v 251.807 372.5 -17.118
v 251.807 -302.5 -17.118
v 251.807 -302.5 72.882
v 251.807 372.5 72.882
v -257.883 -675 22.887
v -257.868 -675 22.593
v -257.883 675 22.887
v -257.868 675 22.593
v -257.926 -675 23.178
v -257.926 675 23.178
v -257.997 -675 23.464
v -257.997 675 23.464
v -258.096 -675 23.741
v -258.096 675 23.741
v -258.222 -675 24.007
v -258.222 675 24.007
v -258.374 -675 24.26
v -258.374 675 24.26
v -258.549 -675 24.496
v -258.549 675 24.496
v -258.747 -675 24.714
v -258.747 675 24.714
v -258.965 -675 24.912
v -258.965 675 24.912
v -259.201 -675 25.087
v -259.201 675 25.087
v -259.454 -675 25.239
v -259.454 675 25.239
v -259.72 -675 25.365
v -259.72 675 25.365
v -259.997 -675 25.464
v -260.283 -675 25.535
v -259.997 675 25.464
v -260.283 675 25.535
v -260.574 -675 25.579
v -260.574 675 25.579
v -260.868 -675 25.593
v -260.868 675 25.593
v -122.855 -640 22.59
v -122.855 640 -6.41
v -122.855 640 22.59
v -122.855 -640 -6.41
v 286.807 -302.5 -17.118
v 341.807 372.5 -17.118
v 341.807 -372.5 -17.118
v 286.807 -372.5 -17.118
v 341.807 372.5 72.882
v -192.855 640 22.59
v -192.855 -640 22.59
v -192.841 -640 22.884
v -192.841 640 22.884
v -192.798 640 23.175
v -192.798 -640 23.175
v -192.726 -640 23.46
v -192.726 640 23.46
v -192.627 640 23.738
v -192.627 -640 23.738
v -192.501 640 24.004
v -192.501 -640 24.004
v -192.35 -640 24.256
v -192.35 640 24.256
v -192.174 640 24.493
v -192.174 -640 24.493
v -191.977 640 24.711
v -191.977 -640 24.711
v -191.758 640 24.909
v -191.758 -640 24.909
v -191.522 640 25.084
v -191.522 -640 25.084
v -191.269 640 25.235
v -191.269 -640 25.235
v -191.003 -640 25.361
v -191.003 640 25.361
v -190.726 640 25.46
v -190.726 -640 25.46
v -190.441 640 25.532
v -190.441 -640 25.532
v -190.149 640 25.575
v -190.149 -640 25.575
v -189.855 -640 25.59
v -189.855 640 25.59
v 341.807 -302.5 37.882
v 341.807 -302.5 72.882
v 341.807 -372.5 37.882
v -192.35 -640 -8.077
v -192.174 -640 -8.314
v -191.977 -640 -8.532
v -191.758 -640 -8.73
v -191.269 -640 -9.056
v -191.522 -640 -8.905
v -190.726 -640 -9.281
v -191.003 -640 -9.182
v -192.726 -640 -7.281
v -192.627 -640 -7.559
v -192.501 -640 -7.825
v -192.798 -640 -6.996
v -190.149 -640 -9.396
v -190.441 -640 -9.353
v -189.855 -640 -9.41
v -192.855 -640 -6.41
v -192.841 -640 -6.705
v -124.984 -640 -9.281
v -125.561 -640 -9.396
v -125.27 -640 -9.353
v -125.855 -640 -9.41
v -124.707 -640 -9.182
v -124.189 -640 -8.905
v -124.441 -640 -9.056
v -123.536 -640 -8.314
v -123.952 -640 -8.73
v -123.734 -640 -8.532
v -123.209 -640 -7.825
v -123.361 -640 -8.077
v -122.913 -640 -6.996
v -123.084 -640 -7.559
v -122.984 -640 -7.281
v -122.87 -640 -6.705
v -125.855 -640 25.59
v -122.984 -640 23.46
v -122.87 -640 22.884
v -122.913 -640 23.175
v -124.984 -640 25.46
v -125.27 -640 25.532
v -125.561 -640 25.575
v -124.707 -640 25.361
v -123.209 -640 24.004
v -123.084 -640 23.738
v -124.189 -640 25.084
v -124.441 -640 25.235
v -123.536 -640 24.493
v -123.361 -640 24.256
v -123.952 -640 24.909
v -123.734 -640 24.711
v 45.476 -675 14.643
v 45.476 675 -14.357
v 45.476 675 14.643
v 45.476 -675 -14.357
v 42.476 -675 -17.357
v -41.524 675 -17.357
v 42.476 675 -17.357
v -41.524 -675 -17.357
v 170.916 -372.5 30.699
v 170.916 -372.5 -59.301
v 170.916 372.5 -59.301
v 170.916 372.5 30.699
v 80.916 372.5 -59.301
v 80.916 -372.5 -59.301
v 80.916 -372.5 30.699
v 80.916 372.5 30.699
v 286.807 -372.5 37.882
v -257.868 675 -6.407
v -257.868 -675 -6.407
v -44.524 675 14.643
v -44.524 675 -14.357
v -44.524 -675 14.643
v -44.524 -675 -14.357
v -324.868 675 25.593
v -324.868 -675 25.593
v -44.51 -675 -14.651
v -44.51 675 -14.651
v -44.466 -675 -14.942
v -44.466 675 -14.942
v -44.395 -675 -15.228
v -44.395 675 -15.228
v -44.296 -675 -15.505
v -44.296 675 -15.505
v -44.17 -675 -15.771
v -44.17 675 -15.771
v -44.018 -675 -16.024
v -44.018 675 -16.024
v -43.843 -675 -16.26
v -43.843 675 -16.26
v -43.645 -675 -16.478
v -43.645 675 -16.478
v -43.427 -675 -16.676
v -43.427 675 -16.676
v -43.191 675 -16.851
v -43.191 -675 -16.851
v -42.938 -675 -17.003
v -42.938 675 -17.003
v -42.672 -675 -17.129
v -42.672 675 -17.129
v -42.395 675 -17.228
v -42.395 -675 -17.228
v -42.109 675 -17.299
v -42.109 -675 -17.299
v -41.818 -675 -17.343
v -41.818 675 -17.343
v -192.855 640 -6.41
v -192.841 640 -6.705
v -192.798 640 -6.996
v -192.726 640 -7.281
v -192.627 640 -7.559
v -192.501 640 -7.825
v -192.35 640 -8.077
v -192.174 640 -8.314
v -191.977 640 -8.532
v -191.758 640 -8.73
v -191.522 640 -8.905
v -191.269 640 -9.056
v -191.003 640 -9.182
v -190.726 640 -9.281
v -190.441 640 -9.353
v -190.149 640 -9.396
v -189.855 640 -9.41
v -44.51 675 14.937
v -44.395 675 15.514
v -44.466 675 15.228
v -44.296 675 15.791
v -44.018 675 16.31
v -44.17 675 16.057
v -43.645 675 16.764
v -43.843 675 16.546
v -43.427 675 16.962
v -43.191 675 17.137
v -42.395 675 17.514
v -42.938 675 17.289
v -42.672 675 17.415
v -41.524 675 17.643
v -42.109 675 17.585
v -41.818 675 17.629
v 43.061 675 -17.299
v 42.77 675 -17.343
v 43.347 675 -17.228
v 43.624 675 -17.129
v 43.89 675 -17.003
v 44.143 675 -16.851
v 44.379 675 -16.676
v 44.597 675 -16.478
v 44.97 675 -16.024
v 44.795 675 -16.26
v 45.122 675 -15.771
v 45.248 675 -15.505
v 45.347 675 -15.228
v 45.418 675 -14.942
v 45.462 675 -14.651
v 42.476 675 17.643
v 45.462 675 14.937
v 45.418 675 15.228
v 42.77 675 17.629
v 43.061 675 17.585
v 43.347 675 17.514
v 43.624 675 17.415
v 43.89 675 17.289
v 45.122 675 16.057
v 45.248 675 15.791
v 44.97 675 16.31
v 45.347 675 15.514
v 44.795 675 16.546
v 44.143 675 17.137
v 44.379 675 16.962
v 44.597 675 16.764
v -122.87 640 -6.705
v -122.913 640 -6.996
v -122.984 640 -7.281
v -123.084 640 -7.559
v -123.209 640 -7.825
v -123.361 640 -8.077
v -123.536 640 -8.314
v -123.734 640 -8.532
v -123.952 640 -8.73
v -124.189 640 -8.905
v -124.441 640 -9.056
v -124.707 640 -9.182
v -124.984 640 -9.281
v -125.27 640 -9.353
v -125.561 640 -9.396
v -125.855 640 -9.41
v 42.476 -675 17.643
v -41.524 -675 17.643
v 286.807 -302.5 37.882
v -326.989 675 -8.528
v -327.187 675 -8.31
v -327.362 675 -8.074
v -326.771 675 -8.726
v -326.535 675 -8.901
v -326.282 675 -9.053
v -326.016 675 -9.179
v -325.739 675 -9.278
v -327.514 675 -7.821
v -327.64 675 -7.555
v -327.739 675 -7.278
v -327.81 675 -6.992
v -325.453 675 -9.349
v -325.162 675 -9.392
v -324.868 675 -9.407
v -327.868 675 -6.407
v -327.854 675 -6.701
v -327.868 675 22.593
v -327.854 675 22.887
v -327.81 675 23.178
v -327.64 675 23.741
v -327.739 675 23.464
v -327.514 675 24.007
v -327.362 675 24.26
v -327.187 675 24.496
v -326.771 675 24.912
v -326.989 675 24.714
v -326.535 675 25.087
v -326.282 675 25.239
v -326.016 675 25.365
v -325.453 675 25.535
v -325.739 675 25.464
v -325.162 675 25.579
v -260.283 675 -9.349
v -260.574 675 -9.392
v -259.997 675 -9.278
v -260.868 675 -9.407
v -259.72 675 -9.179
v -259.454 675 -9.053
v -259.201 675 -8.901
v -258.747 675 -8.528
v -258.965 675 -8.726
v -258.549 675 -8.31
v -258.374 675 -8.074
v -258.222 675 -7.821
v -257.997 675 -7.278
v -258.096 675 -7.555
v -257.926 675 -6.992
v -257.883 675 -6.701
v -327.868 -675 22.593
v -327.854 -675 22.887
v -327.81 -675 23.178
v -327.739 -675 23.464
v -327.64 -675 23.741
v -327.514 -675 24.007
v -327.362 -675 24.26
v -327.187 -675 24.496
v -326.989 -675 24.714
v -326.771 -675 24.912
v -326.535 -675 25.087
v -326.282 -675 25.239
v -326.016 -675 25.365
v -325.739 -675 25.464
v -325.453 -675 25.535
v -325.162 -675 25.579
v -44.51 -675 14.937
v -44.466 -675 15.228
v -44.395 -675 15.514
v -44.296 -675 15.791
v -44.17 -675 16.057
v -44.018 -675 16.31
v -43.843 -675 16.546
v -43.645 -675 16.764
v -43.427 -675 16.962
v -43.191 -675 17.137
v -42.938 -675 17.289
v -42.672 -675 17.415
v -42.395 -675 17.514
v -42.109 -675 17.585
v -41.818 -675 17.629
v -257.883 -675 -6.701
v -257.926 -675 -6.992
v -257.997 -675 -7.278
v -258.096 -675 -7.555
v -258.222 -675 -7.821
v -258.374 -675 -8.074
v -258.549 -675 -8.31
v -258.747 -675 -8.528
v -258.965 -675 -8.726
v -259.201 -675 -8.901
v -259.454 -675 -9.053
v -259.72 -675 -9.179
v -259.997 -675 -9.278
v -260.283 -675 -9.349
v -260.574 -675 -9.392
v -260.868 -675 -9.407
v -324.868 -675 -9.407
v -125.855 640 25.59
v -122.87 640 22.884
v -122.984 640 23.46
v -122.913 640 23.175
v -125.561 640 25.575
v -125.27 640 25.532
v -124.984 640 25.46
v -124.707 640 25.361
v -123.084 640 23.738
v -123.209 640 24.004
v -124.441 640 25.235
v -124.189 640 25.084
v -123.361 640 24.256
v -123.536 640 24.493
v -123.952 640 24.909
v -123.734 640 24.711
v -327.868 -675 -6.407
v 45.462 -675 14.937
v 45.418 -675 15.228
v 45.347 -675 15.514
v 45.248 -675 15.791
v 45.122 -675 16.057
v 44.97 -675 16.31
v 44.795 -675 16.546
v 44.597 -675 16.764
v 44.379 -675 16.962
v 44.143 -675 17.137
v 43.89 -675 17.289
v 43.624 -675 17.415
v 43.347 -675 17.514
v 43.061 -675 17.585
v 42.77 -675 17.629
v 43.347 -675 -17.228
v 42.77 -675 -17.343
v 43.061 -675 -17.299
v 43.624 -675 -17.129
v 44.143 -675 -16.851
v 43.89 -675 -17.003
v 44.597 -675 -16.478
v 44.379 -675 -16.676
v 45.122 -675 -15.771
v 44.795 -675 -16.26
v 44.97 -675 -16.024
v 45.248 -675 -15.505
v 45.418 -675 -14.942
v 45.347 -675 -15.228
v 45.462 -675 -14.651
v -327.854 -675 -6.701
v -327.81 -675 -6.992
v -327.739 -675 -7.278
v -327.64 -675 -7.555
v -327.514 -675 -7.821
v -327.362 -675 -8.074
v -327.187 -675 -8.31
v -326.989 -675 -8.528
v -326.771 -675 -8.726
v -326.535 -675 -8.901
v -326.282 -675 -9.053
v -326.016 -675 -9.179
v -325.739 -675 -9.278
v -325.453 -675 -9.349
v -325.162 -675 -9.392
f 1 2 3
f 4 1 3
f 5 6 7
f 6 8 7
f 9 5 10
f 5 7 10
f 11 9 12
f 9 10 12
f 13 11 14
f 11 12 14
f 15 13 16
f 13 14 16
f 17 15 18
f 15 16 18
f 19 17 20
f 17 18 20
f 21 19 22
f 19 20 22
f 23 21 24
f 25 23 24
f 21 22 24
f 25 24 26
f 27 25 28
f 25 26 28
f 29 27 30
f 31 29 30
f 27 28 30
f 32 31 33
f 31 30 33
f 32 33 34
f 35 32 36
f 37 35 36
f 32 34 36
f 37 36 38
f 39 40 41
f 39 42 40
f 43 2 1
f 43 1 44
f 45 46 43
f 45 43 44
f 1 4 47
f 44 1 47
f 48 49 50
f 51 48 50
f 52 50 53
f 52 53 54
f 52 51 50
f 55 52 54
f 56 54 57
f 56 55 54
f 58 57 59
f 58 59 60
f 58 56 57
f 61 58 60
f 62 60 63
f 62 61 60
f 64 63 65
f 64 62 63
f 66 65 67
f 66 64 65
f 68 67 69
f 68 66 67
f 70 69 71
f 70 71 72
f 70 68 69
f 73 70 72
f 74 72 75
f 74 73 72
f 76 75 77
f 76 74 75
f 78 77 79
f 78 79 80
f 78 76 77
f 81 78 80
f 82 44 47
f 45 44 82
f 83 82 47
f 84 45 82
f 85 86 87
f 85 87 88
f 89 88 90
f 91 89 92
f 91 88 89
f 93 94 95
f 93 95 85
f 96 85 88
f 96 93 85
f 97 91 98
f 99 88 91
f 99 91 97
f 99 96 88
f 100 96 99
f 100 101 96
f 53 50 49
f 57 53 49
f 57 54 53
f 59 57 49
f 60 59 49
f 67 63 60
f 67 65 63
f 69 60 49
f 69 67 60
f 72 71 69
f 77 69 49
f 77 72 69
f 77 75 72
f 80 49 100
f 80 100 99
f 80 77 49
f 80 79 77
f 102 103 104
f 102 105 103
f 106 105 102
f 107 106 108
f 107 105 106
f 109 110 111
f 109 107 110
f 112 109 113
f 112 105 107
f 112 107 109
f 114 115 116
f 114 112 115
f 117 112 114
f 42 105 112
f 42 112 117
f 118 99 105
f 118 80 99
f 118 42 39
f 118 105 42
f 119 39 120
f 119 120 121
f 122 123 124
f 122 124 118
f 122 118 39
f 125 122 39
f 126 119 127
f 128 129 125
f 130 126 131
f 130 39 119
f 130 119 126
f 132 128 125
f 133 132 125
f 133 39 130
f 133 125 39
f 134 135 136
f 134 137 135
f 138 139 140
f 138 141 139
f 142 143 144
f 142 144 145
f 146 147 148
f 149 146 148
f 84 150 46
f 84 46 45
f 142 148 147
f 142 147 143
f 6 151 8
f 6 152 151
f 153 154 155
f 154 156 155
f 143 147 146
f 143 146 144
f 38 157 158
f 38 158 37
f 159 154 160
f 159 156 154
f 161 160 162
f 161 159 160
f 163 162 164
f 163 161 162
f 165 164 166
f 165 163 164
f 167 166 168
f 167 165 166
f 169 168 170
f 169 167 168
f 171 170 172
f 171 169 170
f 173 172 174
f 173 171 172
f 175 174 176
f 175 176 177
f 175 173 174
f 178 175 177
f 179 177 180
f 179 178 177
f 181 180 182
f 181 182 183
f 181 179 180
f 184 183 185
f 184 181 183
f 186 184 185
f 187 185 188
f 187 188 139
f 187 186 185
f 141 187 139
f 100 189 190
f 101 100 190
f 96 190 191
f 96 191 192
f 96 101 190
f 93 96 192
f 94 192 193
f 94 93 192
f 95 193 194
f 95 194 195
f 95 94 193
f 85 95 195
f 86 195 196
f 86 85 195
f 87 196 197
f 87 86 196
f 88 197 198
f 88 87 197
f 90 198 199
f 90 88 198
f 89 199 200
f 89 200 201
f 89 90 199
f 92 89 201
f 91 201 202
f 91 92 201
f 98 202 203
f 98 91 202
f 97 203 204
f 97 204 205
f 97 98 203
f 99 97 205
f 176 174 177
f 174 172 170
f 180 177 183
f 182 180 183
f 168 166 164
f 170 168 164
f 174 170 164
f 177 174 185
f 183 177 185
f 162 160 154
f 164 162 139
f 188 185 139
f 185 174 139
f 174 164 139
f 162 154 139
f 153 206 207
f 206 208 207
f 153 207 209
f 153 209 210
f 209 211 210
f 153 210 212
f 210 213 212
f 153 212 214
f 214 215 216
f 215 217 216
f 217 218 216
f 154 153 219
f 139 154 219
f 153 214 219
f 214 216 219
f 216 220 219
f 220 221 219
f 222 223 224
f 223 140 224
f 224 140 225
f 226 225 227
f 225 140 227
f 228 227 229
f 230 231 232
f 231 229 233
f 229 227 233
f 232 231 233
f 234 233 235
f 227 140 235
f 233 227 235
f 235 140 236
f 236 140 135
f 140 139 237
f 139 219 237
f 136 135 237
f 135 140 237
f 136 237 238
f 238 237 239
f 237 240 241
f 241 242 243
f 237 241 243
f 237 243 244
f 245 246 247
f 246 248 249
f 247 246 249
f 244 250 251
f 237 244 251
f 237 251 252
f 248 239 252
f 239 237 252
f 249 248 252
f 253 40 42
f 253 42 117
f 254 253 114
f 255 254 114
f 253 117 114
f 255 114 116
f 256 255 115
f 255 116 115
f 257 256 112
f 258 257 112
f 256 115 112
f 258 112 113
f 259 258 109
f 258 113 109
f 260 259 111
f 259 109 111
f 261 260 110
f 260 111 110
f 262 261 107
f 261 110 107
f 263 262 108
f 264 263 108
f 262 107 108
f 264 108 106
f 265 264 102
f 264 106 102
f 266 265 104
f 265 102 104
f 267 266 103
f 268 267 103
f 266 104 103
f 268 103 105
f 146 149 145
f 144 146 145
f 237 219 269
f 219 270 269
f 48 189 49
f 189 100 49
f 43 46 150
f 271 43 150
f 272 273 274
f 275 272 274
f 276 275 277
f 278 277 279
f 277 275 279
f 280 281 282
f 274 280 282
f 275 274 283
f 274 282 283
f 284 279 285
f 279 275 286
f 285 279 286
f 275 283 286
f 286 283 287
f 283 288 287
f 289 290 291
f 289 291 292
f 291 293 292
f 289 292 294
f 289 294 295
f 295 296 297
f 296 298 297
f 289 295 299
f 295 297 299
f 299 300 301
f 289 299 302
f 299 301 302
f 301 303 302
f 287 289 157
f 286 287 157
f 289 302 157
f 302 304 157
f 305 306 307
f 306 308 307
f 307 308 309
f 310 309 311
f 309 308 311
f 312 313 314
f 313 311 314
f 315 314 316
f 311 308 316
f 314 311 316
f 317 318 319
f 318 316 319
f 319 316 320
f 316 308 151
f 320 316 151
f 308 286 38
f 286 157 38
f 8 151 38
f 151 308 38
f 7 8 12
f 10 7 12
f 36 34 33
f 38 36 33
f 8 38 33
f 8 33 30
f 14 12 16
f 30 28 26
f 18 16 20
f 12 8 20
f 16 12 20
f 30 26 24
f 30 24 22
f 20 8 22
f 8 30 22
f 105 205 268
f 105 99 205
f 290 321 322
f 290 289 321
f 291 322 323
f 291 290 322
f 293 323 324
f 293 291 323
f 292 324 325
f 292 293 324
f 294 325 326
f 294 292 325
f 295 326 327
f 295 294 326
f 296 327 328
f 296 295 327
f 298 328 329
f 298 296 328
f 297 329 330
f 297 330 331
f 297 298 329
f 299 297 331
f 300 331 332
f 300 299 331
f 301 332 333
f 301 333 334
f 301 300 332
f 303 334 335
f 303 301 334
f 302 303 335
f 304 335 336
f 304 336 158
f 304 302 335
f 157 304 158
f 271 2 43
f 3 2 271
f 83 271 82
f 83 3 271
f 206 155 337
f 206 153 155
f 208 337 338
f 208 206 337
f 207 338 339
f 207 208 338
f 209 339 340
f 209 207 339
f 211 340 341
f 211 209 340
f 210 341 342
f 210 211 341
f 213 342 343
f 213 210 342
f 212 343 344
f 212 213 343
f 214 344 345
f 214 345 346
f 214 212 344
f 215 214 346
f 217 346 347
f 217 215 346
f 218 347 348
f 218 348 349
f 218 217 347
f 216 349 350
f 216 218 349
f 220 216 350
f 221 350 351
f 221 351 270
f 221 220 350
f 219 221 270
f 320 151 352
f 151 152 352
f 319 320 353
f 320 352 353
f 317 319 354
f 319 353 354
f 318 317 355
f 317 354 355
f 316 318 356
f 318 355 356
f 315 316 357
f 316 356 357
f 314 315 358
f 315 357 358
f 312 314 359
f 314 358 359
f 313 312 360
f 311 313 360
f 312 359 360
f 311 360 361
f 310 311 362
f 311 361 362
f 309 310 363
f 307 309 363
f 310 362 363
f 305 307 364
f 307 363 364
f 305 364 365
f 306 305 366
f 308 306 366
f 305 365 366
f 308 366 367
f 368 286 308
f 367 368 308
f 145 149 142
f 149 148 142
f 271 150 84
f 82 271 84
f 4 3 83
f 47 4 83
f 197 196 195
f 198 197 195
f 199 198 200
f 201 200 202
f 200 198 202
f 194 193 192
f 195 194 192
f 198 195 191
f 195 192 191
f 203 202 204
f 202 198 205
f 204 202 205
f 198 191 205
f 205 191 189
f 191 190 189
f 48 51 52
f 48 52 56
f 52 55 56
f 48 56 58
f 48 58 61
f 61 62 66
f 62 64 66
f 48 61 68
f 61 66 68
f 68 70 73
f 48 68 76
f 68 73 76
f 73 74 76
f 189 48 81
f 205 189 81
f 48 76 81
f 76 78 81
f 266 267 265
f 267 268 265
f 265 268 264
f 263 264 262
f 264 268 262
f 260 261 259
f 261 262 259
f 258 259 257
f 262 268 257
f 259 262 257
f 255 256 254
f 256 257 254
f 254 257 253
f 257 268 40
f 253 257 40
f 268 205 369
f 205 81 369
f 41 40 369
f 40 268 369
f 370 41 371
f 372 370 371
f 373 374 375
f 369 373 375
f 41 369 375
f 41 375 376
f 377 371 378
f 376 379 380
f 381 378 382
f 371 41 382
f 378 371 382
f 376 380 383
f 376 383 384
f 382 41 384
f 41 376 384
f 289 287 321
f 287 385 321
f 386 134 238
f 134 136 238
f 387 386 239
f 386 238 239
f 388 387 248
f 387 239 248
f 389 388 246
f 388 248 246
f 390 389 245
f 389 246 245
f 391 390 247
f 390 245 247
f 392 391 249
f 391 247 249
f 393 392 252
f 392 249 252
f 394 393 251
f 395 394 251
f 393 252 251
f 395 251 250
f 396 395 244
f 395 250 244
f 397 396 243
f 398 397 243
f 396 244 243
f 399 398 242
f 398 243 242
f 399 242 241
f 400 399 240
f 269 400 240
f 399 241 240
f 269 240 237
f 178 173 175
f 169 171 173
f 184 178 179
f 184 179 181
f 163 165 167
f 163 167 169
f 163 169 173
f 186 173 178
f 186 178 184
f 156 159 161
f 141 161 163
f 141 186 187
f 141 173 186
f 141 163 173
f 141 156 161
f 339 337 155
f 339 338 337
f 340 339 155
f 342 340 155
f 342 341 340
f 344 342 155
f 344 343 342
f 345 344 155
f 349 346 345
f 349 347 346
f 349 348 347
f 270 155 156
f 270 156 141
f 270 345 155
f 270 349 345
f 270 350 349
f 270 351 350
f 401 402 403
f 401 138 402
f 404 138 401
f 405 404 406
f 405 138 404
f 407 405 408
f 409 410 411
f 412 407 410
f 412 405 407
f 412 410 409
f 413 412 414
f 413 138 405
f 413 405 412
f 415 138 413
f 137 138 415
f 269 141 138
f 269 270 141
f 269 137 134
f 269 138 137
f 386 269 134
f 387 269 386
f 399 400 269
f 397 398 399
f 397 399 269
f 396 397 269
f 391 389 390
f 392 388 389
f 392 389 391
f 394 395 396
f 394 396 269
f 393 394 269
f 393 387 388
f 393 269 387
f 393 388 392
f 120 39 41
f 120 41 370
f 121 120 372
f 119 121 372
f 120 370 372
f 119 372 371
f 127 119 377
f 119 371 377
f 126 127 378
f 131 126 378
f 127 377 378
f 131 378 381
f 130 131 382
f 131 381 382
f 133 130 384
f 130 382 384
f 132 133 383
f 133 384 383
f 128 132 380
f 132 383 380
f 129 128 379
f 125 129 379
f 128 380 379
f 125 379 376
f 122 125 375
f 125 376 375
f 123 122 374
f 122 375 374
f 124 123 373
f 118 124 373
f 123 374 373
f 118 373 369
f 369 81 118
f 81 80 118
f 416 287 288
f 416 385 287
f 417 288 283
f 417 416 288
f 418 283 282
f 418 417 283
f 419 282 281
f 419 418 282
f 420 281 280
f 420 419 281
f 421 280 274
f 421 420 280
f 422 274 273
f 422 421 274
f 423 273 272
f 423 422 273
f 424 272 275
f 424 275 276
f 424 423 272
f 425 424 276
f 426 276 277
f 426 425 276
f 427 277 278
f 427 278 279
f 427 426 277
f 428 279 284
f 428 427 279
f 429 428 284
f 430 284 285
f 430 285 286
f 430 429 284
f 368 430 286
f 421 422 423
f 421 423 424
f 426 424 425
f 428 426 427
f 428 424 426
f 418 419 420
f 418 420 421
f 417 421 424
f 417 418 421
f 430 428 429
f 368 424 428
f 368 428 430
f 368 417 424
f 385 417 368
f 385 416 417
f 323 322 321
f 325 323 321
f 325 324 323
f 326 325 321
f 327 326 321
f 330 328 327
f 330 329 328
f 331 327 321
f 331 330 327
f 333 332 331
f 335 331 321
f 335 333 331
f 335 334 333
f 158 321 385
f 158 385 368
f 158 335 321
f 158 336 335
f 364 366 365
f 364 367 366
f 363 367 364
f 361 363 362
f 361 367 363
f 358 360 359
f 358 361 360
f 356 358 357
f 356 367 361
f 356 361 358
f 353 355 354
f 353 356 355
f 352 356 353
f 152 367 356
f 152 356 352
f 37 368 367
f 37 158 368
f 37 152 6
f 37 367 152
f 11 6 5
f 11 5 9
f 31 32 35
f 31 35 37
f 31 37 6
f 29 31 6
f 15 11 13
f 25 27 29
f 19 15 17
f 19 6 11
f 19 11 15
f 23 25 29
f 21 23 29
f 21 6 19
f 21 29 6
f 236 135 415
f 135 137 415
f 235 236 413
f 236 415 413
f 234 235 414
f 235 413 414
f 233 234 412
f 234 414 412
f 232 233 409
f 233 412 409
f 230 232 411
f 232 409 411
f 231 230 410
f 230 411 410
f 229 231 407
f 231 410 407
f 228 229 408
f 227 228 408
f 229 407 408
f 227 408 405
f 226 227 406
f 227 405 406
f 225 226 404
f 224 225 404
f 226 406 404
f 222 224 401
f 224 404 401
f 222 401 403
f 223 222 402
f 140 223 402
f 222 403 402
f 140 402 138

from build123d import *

# Parameters (mm, degrees)
F0_W      = 90
F0_H      = 35
F1_DEPTH  = 675
F2_R      = 3
F3_W      = 90
F3_H      = 90
F4_DEPTH  = 372.5
F5_W      = 70
F5_H      = 35
F6_DEPTH  = 640
F7_R      = 3
F8_W      = 70
F8_H      = 35
F9_DEPTH  = 675
F10_R     = 3
F11_W     = 90
F11_H     = 90
F12_DEPTH = 372.5
F13_W     = 35
F13_H     = 35
F13_W_2   = 55
F13_H_2   = 55
F14_DEPTH = 70


with BuildPart() as f1:
    # F0 (on Front) → F1 (new body, symmetric)
    with BuildSketch(Plane.XZ):
        with Locations((0.47596, 0.143029)):
            Rectangle(F0_W, F0_H)
    extrude(amount=F1_DEPTH, both=True)

    # F2
    f2_edges = [f1.edges().sort_by_distance(p)[0] for p in [
        (45.47596, 0, 17.643029),
        (45.47596, 0, -17.356971),
        (-44.52404, 0, 17.643029),
        (-44.52404, 0, -17.356971),
    ]]
    fillet(f2_edges, radius=F2_R)


with BuildPart() as f4:
    # F3 (on Front) → F4 (new body, symmetric)
    with BuildSketch(Plane.XZ):
        with Locations((125.915706, -14.301103)):
            Rectangle(F3_W, F3_H)
    extrude(amount=F4_DEPTH, both=True)


with BuildPart() as f6:
    # F5 (on Front) → F6 (new body, symmetric)
    with BuildSketch(Plane.XZ):
        with Locations((-157.855245, 8.089506)):
            Rectangle(F5_W, F5_H)
    extrude(amount=F6_DEPTH, both=True)

    # F7
    f7_edges = [f6.edges().sort_by_distance(p)[0] for p in [
        (-122.855245, 0, 25.589506),
        (-122.855245, 0, -9.410494),
        (-192.855245, 0, 25.589506),
        (-192.855245, 0, -9.410494),
    ]]
    fillet(f7_edges, radius=F7_R)


with BuildPart() as f9:
    # F8 (on Front) → F9 (new body, symmetric)
    with BuildSketch(Plane.XZ):
        with Locations((-292.868074, 8.09309)):
            Rectangle(F8_W, F8_H)
    extrude(amount=F9_DEPTH, both=True)

    # F10
    f10_edges = [f9.edges().sort_by_distance(p)[0] for p in [
        (-327.868074, 0, -9.40691),
        (-327.868074, 0, 25.59309),
        (-257.868074, 0, 25.59309),
        (-257.868074, 0, -9.40691),
    ]]
    fillet(f10_edges, radius=F10_R)


with BuildPart() as f12:
    # F11 (on Front) → F12 (new body, symmetric)
    with BuildSketch(Plane.XZ):
        with Locations((296.807408, 27.882424)):
            Rectangle(F11_W, F11_H)
    extrude(amount=F12_DEPTH, both=True)

    # F13 (on face) → F14 (cut)
    with BuildSketch(Plane.XZ.offset(372.5)):
        with Locations((269.307408, 55.382424)):
            Rectangle(F13_W, F13_H)
        with Locations((314.307408, 55.382424)):
            Rectangle(F13_W_2, F13_H)
        with Locations((269.307408, 10.382424)):
            Rectangle(F13_W, F13_H_2)
    extrude(amount=-F14_DEPTH, mode=Mode.SUBTRACT)


solid = Compound([f1.part, f4.part, f6.part, f9.part, f12.part])
